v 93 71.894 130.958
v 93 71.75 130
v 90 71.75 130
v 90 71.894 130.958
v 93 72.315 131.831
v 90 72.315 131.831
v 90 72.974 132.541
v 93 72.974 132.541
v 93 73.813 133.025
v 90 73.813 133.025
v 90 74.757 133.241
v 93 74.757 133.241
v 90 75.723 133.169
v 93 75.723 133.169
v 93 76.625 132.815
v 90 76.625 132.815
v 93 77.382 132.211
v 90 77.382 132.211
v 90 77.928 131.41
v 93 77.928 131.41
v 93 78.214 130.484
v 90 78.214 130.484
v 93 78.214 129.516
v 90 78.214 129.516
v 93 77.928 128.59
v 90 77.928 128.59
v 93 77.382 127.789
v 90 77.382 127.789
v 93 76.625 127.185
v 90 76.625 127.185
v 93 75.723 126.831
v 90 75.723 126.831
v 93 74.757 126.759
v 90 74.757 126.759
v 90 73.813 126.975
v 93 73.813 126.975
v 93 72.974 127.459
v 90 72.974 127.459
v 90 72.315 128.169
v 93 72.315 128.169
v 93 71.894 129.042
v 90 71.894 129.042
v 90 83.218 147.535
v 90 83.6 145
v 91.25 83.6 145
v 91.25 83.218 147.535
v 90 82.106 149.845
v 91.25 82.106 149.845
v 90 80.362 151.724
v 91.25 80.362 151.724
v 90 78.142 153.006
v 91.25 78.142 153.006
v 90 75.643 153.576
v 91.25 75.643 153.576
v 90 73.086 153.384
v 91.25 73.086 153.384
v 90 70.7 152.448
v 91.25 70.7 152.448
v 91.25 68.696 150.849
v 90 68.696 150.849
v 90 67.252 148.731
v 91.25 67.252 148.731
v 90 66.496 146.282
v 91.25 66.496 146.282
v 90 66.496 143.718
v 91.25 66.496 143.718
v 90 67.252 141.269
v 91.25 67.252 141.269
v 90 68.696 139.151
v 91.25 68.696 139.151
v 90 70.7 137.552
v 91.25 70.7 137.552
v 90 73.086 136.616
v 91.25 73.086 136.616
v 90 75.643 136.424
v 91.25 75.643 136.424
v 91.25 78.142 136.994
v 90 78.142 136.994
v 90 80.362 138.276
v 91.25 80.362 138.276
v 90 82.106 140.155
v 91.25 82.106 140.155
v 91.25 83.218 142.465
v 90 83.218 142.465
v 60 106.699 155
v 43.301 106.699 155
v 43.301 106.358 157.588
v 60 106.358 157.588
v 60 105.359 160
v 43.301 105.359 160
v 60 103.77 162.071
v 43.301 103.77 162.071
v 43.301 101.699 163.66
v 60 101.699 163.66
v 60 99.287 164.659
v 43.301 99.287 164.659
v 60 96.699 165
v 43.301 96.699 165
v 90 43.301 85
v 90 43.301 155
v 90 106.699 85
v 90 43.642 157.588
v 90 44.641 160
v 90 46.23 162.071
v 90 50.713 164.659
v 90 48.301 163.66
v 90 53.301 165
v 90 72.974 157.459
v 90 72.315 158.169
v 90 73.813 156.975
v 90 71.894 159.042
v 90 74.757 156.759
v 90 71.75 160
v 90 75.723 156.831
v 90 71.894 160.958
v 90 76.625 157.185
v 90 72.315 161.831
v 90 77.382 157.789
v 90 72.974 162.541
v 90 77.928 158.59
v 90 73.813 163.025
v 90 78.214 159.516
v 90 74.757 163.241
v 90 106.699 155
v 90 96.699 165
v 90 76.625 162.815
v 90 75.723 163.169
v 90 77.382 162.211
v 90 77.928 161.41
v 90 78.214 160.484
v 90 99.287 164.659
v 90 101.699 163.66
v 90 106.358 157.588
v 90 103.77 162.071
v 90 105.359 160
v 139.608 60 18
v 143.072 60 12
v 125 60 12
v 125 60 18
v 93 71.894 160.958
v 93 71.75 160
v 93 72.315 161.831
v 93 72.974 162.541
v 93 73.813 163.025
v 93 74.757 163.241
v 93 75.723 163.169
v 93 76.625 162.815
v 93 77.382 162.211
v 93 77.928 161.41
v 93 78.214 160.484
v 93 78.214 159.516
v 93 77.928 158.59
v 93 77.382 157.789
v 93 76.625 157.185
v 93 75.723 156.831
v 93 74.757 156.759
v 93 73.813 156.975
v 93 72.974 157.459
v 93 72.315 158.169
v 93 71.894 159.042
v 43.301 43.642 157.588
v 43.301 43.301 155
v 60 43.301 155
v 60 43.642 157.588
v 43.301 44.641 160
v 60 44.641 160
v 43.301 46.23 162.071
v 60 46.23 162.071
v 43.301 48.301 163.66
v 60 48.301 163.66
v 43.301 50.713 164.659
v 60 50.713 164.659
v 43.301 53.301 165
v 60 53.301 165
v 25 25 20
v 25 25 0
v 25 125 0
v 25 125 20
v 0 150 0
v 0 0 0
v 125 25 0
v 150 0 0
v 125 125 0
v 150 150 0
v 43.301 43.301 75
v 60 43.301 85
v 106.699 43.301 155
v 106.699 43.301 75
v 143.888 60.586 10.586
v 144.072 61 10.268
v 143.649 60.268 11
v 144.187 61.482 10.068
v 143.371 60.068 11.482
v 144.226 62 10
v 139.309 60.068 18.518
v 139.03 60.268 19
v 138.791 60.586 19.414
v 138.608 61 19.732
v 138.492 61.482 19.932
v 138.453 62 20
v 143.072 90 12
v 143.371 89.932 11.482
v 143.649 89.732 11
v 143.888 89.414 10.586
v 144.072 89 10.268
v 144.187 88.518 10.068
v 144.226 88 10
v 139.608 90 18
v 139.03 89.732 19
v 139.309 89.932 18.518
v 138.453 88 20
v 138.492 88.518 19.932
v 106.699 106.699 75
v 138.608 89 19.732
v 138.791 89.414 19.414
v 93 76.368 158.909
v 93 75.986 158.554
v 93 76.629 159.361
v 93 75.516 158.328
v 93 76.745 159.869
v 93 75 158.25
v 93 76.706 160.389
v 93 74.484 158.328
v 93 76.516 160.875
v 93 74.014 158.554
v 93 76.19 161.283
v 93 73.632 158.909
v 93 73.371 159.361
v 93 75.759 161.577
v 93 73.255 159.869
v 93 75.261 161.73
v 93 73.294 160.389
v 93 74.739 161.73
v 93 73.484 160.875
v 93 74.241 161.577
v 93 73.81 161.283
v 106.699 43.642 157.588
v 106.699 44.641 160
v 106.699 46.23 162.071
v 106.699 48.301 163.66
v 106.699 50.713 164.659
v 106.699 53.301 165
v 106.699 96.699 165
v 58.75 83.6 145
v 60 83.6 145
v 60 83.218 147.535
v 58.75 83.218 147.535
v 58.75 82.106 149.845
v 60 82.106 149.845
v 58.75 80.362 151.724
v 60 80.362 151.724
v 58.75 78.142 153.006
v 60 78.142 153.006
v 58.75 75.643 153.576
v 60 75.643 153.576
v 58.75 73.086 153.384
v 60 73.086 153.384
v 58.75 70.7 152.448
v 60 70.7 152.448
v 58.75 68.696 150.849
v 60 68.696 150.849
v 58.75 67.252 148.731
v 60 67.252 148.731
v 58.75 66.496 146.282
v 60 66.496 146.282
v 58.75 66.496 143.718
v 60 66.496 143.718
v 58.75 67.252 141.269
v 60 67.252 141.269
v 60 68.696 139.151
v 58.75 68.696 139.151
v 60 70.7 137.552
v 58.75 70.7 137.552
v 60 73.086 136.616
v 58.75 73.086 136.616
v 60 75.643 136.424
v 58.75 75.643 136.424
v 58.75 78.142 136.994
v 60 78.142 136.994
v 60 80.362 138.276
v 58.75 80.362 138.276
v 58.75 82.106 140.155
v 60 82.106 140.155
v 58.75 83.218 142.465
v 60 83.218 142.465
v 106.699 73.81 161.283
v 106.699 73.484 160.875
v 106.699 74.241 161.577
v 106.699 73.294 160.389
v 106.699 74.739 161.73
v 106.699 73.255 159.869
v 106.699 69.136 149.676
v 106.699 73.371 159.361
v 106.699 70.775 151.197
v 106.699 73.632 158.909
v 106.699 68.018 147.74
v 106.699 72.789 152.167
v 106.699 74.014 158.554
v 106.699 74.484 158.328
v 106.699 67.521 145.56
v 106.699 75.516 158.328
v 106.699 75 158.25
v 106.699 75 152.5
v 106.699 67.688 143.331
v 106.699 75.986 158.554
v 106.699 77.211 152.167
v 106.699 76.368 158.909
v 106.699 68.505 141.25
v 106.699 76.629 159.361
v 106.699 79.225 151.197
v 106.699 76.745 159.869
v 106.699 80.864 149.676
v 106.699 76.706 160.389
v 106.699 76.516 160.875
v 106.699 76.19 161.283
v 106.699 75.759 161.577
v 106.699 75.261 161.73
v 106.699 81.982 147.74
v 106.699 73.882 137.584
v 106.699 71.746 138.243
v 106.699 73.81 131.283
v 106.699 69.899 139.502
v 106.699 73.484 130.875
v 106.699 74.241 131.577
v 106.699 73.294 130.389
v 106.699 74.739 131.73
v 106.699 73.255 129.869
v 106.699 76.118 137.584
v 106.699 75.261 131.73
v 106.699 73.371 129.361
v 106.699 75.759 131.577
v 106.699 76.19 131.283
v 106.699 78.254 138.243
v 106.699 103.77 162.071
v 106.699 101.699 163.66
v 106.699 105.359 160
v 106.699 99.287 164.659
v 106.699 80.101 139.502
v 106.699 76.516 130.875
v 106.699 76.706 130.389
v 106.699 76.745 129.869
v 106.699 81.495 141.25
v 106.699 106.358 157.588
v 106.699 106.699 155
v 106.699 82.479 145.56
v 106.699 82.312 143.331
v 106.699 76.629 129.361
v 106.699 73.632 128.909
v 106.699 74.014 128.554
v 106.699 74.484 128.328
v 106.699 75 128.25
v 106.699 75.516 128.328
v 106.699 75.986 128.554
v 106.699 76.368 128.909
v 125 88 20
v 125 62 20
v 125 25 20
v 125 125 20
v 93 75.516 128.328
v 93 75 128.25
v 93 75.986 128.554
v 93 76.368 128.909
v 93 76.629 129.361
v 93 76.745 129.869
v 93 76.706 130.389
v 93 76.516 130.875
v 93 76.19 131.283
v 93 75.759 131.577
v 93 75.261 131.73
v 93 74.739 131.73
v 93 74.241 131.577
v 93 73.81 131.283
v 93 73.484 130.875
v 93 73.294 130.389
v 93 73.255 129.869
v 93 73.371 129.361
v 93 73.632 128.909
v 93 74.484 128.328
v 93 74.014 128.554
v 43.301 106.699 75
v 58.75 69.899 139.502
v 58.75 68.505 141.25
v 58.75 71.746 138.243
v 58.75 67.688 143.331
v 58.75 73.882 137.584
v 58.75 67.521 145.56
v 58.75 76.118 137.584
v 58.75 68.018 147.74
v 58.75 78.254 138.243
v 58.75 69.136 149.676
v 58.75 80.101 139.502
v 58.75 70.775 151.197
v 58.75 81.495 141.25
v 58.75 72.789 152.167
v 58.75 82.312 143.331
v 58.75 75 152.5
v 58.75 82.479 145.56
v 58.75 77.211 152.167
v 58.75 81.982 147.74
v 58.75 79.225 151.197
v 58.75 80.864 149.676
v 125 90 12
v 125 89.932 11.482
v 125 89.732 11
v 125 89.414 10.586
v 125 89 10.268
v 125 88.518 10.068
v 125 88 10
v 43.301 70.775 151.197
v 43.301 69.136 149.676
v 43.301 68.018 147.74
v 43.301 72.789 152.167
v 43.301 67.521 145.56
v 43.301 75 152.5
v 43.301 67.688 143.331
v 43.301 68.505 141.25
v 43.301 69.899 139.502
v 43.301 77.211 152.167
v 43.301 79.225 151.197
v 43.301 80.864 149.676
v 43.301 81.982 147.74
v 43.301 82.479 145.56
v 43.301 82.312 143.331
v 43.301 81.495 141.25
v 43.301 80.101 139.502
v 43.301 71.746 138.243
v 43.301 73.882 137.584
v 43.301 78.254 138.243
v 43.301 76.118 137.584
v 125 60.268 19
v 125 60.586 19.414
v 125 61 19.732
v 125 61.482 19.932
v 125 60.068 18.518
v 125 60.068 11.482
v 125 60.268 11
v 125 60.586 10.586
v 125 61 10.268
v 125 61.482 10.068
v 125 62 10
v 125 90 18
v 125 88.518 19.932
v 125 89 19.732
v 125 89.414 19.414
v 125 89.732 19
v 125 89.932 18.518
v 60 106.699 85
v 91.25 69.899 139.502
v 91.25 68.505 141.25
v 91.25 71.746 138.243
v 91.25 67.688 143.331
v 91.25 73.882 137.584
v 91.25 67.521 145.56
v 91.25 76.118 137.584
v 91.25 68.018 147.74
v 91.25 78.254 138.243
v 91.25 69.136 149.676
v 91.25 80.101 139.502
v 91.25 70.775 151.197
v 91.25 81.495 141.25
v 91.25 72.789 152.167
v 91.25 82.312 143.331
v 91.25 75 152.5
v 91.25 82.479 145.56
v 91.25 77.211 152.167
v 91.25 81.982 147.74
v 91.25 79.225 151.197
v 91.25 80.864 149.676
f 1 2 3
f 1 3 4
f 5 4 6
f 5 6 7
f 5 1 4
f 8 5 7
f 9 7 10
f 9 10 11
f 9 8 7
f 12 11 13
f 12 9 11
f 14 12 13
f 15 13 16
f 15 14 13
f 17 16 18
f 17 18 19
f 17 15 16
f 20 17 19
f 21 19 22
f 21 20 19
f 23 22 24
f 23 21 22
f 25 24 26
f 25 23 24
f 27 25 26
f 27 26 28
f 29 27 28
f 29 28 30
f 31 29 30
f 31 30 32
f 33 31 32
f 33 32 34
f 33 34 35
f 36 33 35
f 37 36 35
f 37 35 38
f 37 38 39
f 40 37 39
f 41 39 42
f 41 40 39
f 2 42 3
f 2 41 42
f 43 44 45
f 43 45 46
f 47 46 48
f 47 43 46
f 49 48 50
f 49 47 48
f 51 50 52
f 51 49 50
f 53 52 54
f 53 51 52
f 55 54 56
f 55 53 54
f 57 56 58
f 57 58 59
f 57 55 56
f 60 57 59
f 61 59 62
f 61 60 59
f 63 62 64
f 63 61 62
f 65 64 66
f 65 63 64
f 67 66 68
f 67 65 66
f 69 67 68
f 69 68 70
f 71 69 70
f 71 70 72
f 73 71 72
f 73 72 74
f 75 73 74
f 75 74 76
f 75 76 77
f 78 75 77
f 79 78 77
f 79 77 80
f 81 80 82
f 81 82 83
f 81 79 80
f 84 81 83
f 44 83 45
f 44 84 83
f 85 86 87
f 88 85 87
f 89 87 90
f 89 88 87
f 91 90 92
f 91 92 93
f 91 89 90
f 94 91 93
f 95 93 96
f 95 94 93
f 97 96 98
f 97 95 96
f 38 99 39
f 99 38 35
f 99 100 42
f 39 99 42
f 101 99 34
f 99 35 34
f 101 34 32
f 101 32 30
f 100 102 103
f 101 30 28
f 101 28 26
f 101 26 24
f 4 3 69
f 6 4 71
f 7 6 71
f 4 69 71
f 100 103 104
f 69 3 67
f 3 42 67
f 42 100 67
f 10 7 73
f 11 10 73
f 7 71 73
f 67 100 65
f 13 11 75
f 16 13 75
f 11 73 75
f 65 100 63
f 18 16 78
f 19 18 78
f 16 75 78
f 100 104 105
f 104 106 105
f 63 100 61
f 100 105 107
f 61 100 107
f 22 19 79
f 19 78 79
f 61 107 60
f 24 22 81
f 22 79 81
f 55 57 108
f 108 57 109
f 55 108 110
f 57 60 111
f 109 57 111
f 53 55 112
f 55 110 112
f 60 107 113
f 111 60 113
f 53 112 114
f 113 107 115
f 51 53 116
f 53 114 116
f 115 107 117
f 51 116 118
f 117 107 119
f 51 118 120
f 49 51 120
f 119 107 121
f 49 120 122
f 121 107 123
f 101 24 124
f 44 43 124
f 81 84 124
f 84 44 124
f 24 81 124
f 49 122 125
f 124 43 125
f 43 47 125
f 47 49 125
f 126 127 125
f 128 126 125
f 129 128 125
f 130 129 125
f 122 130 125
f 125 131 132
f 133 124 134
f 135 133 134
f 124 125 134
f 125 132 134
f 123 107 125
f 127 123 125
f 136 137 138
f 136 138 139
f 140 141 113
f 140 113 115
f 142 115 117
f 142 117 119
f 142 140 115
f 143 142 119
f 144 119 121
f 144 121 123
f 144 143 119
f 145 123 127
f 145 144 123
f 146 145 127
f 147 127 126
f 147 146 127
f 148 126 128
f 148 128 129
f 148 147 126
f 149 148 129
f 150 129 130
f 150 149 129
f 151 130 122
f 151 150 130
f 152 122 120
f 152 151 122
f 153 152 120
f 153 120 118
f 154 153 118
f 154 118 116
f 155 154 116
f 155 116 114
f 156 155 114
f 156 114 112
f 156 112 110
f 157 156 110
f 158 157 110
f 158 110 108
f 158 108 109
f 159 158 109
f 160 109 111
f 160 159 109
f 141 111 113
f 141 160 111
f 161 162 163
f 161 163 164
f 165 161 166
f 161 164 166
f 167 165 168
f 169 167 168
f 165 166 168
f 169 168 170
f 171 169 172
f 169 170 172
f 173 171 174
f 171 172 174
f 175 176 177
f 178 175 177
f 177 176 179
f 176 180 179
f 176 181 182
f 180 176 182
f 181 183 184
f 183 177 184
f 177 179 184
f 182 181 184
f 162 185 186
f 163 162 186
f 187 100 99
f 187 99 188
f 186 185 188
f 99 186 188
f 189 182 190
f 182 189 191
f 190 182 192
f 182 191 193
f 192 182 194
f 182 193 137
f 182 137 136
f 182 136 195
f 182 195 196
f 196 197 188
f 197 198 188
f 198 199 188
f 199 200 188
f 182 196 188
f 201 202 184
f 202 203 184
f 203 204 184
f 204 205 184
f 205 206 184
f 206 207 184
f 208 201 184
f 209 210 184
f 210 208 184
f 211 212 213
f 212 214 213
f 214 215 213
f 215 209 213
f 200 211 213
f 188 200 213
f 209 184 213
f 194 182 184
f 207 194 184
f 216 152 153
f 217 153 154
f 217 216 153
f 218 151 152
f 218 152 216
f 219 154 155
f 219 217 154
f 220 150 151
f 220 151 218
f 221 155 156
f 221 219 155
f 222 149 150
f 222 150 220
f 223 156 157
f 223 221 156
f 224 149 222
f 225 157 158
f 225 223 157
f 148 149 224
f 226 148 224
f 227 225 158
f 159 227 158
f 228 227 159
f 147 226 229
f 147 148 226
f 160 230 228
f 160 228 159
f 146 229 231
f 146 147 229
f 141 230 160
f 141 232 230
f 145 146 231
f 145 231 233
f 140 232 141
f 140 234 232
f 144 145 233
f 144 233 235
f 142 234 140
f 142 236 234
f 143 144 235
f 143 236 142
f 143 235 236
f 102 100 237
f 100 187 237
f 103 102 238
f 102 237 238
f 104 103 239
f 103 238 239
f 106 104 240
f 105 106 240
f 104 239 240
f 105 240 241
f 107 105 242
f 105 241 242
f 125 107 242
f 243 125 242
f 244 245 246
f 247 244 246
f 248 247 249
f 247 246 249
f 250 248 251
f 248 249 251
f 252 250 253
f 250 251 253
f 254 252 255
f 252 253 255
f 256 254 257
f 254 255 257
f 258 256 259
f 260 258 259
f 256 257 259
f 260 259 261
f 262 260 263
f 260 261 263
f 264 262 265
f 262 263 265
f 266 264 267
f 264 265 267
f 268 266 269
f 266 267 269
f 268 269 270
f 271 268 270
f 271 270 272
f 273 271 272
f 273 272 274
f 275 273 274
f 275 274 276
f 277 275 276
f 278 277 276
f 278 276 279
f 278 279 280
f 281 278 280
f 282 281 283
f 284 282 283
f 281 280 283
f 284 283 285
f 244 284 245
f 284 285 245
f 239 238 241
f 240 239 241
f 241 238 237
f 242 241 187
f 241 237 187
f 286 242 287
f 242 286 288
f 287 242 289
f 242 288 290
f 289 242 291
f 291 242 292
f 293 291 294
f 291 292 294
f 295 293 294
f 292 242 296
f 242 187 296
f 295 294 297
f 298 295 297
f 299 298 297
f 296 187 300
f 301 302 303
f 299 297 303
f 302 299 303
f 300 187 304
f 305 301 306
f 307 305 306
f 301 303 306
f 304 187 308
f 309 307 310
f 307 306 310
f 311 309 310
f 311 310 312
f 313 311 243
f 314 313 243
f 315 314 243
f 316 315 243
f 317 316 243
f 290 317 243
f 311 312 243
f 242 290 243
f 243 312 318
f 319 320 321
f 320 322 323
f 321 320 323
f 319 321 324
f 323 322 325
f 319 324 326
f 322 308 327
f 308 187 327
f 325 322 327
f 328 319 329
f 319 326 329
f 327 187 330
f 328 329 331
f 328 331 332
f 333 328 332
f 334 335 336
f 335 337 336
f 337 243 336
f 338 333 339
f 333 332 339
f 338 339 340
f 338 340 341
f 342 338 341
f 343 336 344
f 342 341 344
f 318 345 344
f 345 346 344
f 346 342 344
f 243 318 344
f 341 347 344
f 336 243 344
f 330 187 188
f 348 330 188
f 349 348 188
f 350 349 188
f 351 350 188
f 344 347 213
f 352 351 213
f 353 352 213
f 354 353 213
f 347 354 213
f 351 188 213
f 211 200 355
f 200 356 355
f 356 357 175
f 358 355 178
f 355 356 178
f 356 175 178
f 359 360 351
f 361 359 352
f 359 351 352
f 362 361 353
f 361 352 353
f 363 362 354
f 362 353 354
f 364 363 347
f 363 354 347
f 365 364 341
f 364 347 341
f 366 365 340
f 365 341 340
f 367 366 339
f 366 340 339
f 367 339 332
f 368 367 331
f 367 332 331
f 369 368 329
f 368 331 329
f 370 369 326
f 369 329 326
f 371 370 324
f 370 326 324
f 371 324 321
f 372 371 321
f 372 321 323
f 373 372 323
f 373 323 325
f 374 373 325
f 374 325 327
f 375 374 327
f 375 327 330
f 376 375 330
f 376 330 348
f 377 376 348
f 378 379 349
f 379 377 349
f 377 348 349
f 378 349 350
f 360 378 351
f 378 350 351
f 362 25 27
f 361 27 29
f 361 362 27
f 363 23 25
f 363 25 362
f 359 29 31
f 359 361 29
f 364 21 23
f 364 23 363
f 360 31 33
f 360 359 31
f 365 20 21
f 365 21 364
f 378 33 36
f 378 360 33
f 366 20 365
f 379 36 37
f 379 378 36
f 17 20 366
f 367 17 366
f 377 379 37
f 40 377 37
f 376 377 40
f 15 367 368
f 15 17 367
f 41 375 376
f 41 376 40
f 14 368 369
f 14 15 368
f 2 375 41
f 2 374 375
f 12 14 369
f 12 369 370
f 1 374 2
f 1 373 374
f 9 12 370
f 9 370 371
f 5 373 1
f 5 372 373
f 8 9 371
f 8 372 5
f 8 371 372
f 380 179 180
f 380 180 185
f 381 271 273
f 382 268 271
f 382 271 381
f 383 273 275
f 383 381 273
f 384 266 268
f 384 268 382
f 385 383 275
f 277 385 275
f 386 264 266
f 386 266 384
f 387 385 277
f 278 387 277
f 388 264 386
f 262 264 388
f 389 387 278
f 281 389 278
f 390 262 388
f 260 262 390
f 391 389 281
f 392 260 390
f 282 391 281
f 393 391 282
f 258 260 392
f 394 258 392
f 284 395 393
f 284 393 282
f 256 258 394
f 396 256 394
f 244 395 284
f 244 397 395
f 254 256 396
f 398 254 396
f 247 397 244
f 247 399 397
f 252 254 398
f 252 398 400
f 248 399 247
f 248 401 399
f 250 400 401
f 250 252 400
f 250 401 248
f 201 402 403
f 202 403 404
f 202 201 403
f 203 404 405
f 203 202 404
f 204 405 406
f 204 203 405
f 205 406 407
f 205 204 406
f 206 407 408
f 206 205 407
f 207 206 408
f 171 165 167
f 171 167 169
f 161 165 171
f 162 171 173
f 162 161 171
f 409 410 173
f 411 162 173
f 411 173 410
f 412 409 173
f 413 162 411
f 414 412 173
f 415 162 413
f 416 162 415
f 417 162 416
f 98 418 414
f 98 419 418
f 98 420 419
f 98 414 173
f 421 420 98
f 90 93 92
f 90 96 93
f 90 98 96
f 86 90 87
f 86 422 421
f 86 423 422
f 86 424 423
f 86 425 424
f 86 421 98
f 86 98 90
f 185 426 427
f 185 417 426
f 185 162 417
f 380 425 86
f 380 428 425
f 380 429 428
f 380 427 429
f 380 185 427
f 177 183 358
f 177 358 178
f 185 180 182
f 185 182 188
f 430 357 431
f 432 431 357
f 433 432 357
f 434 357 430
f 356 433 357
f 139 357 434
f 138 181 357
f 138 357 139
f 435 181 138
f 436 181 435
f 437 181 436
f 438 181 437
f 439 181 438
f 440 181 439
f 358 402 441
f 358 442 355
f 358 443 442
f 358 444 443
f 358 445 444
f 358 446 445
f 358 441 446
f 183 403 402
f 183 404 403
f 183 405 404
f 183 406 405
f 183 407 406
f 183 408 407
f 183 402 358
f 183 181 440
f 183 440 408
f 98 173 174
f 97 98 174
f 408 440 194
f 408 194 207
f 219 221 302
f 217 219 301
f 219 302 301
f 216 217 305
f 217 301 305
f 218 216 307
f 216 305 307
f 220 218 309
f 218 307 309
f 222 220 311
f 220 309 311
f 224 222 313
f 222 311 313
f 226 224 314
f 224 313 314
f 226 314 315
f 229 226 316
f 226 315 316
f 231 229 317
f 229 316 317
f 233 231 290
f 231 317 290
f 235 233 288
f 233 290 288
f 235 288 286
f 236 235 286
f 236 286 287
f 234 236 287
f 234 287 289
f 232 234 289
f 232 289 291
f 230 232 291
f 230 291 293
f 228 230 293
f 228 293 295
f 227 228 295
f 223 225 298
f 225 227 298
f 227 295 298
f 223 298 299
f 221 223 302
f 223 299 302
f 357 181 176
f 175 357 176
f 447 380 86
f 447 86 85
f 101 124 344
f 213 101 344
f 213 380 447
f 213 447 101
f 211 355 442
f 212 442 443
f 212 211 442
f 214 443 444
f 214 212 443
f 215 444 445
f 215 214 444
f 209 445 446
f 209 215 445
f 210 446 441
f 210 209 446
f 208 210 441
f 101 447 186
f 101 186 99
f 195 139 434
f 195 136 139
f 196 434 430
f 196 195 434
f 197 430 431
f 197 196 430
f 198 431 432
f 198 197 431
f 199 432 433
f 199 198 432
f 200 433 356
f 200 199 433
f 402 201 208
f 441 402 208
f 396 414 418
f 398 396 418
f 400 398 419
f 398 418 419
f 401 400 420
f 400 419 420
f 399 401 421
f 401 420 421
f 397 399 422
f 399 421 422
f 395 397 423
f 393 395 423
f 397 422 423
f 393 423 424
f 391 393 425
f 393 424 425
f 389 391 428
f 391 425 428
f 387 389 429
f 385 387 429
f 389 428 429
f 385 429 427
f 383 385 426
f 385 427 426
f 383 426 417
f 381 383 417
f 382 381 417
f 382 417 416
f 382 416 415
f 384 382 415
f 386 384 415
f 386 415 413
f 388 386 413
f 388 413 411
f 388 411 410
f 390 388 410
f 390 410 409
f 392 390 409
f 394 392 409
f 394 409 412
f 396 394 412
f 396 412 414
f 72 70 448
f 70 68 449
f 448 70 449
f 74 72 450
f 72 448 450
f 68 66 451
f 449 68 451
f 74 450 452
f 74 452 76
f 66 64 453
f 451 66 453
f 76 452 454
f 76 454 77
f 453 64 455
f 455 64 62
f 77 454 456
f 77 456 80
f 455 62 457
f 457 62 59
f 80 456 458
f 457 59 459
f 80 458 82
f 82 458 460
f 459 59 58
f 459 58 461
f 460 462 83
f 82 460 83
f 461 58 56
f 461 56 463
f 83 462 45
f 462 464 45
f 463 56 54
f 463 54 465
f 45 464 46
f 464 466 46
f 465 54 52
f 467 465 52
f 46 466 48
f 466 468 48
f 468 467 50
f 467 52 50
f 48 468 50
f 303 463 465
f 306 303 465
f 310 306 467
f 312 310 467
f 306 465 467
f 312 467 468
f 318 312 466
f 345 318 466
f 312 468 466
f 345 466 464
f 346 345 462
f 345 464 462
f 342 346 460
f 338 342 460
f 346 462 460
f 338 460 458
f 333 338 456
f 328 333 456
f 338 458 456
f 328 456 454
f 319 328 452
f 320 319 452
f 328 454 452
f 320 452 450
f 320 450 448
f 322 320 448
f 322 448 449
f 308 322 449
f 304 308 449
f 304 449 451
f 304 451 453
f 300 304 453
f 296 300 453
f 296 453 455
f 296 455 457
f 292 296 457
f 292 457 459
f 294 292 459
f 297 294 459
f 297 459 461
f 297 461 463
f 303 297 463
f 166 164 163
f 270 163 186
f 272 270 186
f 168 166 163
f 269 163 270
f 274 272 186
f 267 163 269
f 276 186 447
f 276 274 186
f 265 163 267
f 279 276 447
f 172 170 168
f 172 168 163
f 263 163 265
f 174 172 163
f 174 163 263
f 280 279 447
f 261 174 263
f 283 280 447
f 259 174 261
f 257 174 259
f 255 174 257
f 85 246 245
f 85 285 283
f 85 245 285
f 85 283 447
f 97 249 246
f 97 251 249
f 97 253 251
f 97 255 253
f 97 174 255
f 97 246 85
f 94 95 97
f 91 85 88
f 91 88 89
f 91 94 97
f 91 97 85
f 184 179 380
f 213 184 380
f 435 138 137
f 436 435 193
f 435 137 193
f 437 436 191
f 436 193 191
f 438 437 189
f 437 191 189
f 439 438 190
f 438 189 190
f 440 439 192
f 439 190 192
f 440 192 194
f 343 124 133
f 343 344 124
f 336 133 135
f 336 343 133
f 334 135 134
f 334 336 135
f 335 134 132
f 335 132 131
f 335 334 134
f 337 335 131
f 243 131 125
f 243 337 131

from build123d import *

# Parameters (mm, degrees)
SKETCH2_W           = 150
SKETCH2_H           = 150
BOSS_EXTRUDE1_DEPTH = 75
BOSS_EXTRUDE1_TAPER = 30
SKETCH3_W           = 63.397459622
SKETCH3_H           = 63.397459622
BOSS_EXTRUDE2_DEPTH = 90
SKETCH4_W           = 30
SKETCH4_H           = 63.397459622
CUT_EXTRUDE1_DEPTH  = 80
FILLET1_R           = 10
CUT_EXTRUDE2_REACH  = 249.204
SKETCH5_R           = 7.5
SKETCH6_W           = 100
SKETCH6_H           = 100
CUT_EXTRUDE3_DEPTH  = 20
SKETCH7_W           = 10
SKETCH7_H           = 30
CUT_EXTRUDE4_DEPTH  = 256.636460623
FILLET2_R           = 2
SKETCH8_R           = 1.75
CUT_EXTRUDE5_DEPTH  = 16.698729811
CUT_EXTRUDE6_START  = -3
SKETCH9_R           = 3.25
SKETCH9_R_2         = 1.75
CUT_EXTRUDE6_DEPTH  = 3
SKETCH10_R          = 8.6
CUT_EXTRUDE7_DEPTH  = 1.25


with BuildPart() as part:
    # Sketch2 → Boss-Extrude1 (new body)
    with BuildSketch(Plane.XY):
        with Locations((75, 75)):
            Rectangle(SKETCH2_W, SKETCH2_H)
    extrude(amount=BOSS_EXTRUDE1_DEPTH, taper=BOSS_EXTRUDE1_TAPER)

    # Sketch3 → Boss-Extrude2 (add)
    with BuildSketch(Plane.XY.offset(75)):
        with Locations((75, 75)):
            Rectangle(SKETCH3_W, SKETCH3_H)
    extrude(amount=BOSS_EXTRUDE2_DEPTH)

    # Sketch4 → Cut-Extrude1 (cut)
    with BuildSketch(Plane.XY.offset(165)):
        with Locations((75, 75)):
            Rectangle(SKETCH4_W, SKETCH4_H)
    extrude(amount=-CUT_EXTRUDE1_DEPTH, mode=Mode.SUBTRACT)

    # Fillet1
    fillet1_edges = [part.edges().sort_by_distance(p)[0] for p in [
        (98.349364905, 106.698729811, 165),
        (51.650635095, 43.301270189, 165),
        (51.650635095, 106.698729811, 165),
        (98.349364905, 43.301270189, 165),
    ]]
    fillet(fillet1_edges, radius=FILLET1_R)

    # Cut-Extrude2: up to this face of the body (flat: up to its plane)
    cut_extrude2_end = Plane(part.part.faces().sort_by_distance((106.698729811, 75, 119.675861825))[0])
    # Sketch5 → Cut-Extrude2 (cut, up to the picked face)
    with BuildSketch(Plane.ZY.offset(-43.301270189), mode=Mode.PRIVATE) as cut_extrude2_sk1:
        with Locations((145, 75)):
            Circle(SKETCH5_R)
    cut_extrude2_tool1 = split(extrude(cut_extrude2_sk1.sketch, amount=-CUT_EXTRUDE2_REACH, mode=Mode.PRIVATE), bisect_by=cut_extrude2_end, keep=Keep.BOTH, mode=Mode.PRIVATE)
    add(cut_extrude2_tool1.solids().sort_by(Axis((43.30127, 75, 145), (1, 0, 0)))[0], mode=Mode.SUBTRACT)

    # Sketch6 → Cut-Extrude3 (cut)
    with BuildSketch(Plane(origin=(0, 0, 0), x_dir=(-1, 0, 0), z_dir=(0, 0, -1))):
        with Locations((-75, 75)):
            Rectangle(SKETCH6_W, SKETCH6_H)
    extrude(amount=-CUT_EXTRUDE3_DEPTH, mode=Mode.SUBTRACT)

    # Sketch7 → Cut-Extrude4 (cut, through all)
    with BuildSketch(Plane.ZY.offset(-125)):
        with Locations((15, 75)):
            Rectangle(SKETCH7_W, SKETCH7_H)
    extrude(amount=-CUT_EXTRUDE4_DEPTH, mode=Mode.SUBTRACT)

    # Fillet2
    fillet2_edges = [part.edges().sort_by_distance(p)[0] for p in [
        (131.726497308, 90, 20),
        (131.726497308, 60, 20),
        (134.613248654, 60, 10),
        (134.613248654, 90, 10),
    ]]
    fillet(fillet2_edges, radius=FILLET2_R)

    # Sketch8 → Cut-Extrude5 (cut)
    with BuildSketch(Plane(origin=(106.698729811, 0, 0), x_dir=(0, 0, -1), z_dir=(1, 0, 0))):
        with Locations((-160, 75)):
            Circle(SKETCH8_R)
        with Locations((-130, 75)):
            Circle(SKETCH8_R)
    extrude(amount=-CUT_EXTRUDE5_DEPTH, mode=Mode.SUBTRACT)

    # Sketch9 → Cut-Extrude6 (cut)
    # profile 1 of 2: a face of its own
    with BuildSketch(Plane.ZY.offset(-90).offset(CUT_EXTRUDE6_START)):
        with Locations(Location((160, 75, 0), (0, 0, 270))):
            Circle(SKETCH9_R)
        with Locations(Location((160, 75, 0), (0, 0, 180))):
            Circle(SKETCH9_R_2, mode=Mode.SUBTRACT)
    # profile 2 of 2: a face of its own
    with BuildSketch(Plane.ZY.offset(-90).offset(CUT_EXTRUDE6_START)):
        with Locations(Location((130, 75, 0), (0, 0, 270))):
            Circle(SKETCH9_R)
        with Locations(Location((130, 75, 0), (0, 0, 180))):
            Circle(SKETCH9_R_2, mode=Mode.SUBTRACT)
    extrude(amount=CUT_EXTRUDE6_DEPTH, mode=Mode.SUBTRACT)

    # Sketch10 → Cut-Extrude7 (cut)
    with BuildSketch(Plane(origin=(60, 0, 0), x_dir=(0, 0, -1), z_dir=(1, 0, 0))):
        with Locations(Location((-145, 75, 0), (0, 0, 90))):
            Circle(SKETCH10_R)
    cut_extrude7 = extrude(amount=-CUT_EXTRUDE7_DEPTH, mode=Mode.SUBTRACT)

    # Mirror1: Cut-Extrude7 across plane
    add(cut_extrude7.mirror(Plane(origin=(75, 0, 0), x_dir=(0, 0, 1), z_dir=(1, 0, 0))), mode=Mode.SUBTRACT)


solid = part.part
